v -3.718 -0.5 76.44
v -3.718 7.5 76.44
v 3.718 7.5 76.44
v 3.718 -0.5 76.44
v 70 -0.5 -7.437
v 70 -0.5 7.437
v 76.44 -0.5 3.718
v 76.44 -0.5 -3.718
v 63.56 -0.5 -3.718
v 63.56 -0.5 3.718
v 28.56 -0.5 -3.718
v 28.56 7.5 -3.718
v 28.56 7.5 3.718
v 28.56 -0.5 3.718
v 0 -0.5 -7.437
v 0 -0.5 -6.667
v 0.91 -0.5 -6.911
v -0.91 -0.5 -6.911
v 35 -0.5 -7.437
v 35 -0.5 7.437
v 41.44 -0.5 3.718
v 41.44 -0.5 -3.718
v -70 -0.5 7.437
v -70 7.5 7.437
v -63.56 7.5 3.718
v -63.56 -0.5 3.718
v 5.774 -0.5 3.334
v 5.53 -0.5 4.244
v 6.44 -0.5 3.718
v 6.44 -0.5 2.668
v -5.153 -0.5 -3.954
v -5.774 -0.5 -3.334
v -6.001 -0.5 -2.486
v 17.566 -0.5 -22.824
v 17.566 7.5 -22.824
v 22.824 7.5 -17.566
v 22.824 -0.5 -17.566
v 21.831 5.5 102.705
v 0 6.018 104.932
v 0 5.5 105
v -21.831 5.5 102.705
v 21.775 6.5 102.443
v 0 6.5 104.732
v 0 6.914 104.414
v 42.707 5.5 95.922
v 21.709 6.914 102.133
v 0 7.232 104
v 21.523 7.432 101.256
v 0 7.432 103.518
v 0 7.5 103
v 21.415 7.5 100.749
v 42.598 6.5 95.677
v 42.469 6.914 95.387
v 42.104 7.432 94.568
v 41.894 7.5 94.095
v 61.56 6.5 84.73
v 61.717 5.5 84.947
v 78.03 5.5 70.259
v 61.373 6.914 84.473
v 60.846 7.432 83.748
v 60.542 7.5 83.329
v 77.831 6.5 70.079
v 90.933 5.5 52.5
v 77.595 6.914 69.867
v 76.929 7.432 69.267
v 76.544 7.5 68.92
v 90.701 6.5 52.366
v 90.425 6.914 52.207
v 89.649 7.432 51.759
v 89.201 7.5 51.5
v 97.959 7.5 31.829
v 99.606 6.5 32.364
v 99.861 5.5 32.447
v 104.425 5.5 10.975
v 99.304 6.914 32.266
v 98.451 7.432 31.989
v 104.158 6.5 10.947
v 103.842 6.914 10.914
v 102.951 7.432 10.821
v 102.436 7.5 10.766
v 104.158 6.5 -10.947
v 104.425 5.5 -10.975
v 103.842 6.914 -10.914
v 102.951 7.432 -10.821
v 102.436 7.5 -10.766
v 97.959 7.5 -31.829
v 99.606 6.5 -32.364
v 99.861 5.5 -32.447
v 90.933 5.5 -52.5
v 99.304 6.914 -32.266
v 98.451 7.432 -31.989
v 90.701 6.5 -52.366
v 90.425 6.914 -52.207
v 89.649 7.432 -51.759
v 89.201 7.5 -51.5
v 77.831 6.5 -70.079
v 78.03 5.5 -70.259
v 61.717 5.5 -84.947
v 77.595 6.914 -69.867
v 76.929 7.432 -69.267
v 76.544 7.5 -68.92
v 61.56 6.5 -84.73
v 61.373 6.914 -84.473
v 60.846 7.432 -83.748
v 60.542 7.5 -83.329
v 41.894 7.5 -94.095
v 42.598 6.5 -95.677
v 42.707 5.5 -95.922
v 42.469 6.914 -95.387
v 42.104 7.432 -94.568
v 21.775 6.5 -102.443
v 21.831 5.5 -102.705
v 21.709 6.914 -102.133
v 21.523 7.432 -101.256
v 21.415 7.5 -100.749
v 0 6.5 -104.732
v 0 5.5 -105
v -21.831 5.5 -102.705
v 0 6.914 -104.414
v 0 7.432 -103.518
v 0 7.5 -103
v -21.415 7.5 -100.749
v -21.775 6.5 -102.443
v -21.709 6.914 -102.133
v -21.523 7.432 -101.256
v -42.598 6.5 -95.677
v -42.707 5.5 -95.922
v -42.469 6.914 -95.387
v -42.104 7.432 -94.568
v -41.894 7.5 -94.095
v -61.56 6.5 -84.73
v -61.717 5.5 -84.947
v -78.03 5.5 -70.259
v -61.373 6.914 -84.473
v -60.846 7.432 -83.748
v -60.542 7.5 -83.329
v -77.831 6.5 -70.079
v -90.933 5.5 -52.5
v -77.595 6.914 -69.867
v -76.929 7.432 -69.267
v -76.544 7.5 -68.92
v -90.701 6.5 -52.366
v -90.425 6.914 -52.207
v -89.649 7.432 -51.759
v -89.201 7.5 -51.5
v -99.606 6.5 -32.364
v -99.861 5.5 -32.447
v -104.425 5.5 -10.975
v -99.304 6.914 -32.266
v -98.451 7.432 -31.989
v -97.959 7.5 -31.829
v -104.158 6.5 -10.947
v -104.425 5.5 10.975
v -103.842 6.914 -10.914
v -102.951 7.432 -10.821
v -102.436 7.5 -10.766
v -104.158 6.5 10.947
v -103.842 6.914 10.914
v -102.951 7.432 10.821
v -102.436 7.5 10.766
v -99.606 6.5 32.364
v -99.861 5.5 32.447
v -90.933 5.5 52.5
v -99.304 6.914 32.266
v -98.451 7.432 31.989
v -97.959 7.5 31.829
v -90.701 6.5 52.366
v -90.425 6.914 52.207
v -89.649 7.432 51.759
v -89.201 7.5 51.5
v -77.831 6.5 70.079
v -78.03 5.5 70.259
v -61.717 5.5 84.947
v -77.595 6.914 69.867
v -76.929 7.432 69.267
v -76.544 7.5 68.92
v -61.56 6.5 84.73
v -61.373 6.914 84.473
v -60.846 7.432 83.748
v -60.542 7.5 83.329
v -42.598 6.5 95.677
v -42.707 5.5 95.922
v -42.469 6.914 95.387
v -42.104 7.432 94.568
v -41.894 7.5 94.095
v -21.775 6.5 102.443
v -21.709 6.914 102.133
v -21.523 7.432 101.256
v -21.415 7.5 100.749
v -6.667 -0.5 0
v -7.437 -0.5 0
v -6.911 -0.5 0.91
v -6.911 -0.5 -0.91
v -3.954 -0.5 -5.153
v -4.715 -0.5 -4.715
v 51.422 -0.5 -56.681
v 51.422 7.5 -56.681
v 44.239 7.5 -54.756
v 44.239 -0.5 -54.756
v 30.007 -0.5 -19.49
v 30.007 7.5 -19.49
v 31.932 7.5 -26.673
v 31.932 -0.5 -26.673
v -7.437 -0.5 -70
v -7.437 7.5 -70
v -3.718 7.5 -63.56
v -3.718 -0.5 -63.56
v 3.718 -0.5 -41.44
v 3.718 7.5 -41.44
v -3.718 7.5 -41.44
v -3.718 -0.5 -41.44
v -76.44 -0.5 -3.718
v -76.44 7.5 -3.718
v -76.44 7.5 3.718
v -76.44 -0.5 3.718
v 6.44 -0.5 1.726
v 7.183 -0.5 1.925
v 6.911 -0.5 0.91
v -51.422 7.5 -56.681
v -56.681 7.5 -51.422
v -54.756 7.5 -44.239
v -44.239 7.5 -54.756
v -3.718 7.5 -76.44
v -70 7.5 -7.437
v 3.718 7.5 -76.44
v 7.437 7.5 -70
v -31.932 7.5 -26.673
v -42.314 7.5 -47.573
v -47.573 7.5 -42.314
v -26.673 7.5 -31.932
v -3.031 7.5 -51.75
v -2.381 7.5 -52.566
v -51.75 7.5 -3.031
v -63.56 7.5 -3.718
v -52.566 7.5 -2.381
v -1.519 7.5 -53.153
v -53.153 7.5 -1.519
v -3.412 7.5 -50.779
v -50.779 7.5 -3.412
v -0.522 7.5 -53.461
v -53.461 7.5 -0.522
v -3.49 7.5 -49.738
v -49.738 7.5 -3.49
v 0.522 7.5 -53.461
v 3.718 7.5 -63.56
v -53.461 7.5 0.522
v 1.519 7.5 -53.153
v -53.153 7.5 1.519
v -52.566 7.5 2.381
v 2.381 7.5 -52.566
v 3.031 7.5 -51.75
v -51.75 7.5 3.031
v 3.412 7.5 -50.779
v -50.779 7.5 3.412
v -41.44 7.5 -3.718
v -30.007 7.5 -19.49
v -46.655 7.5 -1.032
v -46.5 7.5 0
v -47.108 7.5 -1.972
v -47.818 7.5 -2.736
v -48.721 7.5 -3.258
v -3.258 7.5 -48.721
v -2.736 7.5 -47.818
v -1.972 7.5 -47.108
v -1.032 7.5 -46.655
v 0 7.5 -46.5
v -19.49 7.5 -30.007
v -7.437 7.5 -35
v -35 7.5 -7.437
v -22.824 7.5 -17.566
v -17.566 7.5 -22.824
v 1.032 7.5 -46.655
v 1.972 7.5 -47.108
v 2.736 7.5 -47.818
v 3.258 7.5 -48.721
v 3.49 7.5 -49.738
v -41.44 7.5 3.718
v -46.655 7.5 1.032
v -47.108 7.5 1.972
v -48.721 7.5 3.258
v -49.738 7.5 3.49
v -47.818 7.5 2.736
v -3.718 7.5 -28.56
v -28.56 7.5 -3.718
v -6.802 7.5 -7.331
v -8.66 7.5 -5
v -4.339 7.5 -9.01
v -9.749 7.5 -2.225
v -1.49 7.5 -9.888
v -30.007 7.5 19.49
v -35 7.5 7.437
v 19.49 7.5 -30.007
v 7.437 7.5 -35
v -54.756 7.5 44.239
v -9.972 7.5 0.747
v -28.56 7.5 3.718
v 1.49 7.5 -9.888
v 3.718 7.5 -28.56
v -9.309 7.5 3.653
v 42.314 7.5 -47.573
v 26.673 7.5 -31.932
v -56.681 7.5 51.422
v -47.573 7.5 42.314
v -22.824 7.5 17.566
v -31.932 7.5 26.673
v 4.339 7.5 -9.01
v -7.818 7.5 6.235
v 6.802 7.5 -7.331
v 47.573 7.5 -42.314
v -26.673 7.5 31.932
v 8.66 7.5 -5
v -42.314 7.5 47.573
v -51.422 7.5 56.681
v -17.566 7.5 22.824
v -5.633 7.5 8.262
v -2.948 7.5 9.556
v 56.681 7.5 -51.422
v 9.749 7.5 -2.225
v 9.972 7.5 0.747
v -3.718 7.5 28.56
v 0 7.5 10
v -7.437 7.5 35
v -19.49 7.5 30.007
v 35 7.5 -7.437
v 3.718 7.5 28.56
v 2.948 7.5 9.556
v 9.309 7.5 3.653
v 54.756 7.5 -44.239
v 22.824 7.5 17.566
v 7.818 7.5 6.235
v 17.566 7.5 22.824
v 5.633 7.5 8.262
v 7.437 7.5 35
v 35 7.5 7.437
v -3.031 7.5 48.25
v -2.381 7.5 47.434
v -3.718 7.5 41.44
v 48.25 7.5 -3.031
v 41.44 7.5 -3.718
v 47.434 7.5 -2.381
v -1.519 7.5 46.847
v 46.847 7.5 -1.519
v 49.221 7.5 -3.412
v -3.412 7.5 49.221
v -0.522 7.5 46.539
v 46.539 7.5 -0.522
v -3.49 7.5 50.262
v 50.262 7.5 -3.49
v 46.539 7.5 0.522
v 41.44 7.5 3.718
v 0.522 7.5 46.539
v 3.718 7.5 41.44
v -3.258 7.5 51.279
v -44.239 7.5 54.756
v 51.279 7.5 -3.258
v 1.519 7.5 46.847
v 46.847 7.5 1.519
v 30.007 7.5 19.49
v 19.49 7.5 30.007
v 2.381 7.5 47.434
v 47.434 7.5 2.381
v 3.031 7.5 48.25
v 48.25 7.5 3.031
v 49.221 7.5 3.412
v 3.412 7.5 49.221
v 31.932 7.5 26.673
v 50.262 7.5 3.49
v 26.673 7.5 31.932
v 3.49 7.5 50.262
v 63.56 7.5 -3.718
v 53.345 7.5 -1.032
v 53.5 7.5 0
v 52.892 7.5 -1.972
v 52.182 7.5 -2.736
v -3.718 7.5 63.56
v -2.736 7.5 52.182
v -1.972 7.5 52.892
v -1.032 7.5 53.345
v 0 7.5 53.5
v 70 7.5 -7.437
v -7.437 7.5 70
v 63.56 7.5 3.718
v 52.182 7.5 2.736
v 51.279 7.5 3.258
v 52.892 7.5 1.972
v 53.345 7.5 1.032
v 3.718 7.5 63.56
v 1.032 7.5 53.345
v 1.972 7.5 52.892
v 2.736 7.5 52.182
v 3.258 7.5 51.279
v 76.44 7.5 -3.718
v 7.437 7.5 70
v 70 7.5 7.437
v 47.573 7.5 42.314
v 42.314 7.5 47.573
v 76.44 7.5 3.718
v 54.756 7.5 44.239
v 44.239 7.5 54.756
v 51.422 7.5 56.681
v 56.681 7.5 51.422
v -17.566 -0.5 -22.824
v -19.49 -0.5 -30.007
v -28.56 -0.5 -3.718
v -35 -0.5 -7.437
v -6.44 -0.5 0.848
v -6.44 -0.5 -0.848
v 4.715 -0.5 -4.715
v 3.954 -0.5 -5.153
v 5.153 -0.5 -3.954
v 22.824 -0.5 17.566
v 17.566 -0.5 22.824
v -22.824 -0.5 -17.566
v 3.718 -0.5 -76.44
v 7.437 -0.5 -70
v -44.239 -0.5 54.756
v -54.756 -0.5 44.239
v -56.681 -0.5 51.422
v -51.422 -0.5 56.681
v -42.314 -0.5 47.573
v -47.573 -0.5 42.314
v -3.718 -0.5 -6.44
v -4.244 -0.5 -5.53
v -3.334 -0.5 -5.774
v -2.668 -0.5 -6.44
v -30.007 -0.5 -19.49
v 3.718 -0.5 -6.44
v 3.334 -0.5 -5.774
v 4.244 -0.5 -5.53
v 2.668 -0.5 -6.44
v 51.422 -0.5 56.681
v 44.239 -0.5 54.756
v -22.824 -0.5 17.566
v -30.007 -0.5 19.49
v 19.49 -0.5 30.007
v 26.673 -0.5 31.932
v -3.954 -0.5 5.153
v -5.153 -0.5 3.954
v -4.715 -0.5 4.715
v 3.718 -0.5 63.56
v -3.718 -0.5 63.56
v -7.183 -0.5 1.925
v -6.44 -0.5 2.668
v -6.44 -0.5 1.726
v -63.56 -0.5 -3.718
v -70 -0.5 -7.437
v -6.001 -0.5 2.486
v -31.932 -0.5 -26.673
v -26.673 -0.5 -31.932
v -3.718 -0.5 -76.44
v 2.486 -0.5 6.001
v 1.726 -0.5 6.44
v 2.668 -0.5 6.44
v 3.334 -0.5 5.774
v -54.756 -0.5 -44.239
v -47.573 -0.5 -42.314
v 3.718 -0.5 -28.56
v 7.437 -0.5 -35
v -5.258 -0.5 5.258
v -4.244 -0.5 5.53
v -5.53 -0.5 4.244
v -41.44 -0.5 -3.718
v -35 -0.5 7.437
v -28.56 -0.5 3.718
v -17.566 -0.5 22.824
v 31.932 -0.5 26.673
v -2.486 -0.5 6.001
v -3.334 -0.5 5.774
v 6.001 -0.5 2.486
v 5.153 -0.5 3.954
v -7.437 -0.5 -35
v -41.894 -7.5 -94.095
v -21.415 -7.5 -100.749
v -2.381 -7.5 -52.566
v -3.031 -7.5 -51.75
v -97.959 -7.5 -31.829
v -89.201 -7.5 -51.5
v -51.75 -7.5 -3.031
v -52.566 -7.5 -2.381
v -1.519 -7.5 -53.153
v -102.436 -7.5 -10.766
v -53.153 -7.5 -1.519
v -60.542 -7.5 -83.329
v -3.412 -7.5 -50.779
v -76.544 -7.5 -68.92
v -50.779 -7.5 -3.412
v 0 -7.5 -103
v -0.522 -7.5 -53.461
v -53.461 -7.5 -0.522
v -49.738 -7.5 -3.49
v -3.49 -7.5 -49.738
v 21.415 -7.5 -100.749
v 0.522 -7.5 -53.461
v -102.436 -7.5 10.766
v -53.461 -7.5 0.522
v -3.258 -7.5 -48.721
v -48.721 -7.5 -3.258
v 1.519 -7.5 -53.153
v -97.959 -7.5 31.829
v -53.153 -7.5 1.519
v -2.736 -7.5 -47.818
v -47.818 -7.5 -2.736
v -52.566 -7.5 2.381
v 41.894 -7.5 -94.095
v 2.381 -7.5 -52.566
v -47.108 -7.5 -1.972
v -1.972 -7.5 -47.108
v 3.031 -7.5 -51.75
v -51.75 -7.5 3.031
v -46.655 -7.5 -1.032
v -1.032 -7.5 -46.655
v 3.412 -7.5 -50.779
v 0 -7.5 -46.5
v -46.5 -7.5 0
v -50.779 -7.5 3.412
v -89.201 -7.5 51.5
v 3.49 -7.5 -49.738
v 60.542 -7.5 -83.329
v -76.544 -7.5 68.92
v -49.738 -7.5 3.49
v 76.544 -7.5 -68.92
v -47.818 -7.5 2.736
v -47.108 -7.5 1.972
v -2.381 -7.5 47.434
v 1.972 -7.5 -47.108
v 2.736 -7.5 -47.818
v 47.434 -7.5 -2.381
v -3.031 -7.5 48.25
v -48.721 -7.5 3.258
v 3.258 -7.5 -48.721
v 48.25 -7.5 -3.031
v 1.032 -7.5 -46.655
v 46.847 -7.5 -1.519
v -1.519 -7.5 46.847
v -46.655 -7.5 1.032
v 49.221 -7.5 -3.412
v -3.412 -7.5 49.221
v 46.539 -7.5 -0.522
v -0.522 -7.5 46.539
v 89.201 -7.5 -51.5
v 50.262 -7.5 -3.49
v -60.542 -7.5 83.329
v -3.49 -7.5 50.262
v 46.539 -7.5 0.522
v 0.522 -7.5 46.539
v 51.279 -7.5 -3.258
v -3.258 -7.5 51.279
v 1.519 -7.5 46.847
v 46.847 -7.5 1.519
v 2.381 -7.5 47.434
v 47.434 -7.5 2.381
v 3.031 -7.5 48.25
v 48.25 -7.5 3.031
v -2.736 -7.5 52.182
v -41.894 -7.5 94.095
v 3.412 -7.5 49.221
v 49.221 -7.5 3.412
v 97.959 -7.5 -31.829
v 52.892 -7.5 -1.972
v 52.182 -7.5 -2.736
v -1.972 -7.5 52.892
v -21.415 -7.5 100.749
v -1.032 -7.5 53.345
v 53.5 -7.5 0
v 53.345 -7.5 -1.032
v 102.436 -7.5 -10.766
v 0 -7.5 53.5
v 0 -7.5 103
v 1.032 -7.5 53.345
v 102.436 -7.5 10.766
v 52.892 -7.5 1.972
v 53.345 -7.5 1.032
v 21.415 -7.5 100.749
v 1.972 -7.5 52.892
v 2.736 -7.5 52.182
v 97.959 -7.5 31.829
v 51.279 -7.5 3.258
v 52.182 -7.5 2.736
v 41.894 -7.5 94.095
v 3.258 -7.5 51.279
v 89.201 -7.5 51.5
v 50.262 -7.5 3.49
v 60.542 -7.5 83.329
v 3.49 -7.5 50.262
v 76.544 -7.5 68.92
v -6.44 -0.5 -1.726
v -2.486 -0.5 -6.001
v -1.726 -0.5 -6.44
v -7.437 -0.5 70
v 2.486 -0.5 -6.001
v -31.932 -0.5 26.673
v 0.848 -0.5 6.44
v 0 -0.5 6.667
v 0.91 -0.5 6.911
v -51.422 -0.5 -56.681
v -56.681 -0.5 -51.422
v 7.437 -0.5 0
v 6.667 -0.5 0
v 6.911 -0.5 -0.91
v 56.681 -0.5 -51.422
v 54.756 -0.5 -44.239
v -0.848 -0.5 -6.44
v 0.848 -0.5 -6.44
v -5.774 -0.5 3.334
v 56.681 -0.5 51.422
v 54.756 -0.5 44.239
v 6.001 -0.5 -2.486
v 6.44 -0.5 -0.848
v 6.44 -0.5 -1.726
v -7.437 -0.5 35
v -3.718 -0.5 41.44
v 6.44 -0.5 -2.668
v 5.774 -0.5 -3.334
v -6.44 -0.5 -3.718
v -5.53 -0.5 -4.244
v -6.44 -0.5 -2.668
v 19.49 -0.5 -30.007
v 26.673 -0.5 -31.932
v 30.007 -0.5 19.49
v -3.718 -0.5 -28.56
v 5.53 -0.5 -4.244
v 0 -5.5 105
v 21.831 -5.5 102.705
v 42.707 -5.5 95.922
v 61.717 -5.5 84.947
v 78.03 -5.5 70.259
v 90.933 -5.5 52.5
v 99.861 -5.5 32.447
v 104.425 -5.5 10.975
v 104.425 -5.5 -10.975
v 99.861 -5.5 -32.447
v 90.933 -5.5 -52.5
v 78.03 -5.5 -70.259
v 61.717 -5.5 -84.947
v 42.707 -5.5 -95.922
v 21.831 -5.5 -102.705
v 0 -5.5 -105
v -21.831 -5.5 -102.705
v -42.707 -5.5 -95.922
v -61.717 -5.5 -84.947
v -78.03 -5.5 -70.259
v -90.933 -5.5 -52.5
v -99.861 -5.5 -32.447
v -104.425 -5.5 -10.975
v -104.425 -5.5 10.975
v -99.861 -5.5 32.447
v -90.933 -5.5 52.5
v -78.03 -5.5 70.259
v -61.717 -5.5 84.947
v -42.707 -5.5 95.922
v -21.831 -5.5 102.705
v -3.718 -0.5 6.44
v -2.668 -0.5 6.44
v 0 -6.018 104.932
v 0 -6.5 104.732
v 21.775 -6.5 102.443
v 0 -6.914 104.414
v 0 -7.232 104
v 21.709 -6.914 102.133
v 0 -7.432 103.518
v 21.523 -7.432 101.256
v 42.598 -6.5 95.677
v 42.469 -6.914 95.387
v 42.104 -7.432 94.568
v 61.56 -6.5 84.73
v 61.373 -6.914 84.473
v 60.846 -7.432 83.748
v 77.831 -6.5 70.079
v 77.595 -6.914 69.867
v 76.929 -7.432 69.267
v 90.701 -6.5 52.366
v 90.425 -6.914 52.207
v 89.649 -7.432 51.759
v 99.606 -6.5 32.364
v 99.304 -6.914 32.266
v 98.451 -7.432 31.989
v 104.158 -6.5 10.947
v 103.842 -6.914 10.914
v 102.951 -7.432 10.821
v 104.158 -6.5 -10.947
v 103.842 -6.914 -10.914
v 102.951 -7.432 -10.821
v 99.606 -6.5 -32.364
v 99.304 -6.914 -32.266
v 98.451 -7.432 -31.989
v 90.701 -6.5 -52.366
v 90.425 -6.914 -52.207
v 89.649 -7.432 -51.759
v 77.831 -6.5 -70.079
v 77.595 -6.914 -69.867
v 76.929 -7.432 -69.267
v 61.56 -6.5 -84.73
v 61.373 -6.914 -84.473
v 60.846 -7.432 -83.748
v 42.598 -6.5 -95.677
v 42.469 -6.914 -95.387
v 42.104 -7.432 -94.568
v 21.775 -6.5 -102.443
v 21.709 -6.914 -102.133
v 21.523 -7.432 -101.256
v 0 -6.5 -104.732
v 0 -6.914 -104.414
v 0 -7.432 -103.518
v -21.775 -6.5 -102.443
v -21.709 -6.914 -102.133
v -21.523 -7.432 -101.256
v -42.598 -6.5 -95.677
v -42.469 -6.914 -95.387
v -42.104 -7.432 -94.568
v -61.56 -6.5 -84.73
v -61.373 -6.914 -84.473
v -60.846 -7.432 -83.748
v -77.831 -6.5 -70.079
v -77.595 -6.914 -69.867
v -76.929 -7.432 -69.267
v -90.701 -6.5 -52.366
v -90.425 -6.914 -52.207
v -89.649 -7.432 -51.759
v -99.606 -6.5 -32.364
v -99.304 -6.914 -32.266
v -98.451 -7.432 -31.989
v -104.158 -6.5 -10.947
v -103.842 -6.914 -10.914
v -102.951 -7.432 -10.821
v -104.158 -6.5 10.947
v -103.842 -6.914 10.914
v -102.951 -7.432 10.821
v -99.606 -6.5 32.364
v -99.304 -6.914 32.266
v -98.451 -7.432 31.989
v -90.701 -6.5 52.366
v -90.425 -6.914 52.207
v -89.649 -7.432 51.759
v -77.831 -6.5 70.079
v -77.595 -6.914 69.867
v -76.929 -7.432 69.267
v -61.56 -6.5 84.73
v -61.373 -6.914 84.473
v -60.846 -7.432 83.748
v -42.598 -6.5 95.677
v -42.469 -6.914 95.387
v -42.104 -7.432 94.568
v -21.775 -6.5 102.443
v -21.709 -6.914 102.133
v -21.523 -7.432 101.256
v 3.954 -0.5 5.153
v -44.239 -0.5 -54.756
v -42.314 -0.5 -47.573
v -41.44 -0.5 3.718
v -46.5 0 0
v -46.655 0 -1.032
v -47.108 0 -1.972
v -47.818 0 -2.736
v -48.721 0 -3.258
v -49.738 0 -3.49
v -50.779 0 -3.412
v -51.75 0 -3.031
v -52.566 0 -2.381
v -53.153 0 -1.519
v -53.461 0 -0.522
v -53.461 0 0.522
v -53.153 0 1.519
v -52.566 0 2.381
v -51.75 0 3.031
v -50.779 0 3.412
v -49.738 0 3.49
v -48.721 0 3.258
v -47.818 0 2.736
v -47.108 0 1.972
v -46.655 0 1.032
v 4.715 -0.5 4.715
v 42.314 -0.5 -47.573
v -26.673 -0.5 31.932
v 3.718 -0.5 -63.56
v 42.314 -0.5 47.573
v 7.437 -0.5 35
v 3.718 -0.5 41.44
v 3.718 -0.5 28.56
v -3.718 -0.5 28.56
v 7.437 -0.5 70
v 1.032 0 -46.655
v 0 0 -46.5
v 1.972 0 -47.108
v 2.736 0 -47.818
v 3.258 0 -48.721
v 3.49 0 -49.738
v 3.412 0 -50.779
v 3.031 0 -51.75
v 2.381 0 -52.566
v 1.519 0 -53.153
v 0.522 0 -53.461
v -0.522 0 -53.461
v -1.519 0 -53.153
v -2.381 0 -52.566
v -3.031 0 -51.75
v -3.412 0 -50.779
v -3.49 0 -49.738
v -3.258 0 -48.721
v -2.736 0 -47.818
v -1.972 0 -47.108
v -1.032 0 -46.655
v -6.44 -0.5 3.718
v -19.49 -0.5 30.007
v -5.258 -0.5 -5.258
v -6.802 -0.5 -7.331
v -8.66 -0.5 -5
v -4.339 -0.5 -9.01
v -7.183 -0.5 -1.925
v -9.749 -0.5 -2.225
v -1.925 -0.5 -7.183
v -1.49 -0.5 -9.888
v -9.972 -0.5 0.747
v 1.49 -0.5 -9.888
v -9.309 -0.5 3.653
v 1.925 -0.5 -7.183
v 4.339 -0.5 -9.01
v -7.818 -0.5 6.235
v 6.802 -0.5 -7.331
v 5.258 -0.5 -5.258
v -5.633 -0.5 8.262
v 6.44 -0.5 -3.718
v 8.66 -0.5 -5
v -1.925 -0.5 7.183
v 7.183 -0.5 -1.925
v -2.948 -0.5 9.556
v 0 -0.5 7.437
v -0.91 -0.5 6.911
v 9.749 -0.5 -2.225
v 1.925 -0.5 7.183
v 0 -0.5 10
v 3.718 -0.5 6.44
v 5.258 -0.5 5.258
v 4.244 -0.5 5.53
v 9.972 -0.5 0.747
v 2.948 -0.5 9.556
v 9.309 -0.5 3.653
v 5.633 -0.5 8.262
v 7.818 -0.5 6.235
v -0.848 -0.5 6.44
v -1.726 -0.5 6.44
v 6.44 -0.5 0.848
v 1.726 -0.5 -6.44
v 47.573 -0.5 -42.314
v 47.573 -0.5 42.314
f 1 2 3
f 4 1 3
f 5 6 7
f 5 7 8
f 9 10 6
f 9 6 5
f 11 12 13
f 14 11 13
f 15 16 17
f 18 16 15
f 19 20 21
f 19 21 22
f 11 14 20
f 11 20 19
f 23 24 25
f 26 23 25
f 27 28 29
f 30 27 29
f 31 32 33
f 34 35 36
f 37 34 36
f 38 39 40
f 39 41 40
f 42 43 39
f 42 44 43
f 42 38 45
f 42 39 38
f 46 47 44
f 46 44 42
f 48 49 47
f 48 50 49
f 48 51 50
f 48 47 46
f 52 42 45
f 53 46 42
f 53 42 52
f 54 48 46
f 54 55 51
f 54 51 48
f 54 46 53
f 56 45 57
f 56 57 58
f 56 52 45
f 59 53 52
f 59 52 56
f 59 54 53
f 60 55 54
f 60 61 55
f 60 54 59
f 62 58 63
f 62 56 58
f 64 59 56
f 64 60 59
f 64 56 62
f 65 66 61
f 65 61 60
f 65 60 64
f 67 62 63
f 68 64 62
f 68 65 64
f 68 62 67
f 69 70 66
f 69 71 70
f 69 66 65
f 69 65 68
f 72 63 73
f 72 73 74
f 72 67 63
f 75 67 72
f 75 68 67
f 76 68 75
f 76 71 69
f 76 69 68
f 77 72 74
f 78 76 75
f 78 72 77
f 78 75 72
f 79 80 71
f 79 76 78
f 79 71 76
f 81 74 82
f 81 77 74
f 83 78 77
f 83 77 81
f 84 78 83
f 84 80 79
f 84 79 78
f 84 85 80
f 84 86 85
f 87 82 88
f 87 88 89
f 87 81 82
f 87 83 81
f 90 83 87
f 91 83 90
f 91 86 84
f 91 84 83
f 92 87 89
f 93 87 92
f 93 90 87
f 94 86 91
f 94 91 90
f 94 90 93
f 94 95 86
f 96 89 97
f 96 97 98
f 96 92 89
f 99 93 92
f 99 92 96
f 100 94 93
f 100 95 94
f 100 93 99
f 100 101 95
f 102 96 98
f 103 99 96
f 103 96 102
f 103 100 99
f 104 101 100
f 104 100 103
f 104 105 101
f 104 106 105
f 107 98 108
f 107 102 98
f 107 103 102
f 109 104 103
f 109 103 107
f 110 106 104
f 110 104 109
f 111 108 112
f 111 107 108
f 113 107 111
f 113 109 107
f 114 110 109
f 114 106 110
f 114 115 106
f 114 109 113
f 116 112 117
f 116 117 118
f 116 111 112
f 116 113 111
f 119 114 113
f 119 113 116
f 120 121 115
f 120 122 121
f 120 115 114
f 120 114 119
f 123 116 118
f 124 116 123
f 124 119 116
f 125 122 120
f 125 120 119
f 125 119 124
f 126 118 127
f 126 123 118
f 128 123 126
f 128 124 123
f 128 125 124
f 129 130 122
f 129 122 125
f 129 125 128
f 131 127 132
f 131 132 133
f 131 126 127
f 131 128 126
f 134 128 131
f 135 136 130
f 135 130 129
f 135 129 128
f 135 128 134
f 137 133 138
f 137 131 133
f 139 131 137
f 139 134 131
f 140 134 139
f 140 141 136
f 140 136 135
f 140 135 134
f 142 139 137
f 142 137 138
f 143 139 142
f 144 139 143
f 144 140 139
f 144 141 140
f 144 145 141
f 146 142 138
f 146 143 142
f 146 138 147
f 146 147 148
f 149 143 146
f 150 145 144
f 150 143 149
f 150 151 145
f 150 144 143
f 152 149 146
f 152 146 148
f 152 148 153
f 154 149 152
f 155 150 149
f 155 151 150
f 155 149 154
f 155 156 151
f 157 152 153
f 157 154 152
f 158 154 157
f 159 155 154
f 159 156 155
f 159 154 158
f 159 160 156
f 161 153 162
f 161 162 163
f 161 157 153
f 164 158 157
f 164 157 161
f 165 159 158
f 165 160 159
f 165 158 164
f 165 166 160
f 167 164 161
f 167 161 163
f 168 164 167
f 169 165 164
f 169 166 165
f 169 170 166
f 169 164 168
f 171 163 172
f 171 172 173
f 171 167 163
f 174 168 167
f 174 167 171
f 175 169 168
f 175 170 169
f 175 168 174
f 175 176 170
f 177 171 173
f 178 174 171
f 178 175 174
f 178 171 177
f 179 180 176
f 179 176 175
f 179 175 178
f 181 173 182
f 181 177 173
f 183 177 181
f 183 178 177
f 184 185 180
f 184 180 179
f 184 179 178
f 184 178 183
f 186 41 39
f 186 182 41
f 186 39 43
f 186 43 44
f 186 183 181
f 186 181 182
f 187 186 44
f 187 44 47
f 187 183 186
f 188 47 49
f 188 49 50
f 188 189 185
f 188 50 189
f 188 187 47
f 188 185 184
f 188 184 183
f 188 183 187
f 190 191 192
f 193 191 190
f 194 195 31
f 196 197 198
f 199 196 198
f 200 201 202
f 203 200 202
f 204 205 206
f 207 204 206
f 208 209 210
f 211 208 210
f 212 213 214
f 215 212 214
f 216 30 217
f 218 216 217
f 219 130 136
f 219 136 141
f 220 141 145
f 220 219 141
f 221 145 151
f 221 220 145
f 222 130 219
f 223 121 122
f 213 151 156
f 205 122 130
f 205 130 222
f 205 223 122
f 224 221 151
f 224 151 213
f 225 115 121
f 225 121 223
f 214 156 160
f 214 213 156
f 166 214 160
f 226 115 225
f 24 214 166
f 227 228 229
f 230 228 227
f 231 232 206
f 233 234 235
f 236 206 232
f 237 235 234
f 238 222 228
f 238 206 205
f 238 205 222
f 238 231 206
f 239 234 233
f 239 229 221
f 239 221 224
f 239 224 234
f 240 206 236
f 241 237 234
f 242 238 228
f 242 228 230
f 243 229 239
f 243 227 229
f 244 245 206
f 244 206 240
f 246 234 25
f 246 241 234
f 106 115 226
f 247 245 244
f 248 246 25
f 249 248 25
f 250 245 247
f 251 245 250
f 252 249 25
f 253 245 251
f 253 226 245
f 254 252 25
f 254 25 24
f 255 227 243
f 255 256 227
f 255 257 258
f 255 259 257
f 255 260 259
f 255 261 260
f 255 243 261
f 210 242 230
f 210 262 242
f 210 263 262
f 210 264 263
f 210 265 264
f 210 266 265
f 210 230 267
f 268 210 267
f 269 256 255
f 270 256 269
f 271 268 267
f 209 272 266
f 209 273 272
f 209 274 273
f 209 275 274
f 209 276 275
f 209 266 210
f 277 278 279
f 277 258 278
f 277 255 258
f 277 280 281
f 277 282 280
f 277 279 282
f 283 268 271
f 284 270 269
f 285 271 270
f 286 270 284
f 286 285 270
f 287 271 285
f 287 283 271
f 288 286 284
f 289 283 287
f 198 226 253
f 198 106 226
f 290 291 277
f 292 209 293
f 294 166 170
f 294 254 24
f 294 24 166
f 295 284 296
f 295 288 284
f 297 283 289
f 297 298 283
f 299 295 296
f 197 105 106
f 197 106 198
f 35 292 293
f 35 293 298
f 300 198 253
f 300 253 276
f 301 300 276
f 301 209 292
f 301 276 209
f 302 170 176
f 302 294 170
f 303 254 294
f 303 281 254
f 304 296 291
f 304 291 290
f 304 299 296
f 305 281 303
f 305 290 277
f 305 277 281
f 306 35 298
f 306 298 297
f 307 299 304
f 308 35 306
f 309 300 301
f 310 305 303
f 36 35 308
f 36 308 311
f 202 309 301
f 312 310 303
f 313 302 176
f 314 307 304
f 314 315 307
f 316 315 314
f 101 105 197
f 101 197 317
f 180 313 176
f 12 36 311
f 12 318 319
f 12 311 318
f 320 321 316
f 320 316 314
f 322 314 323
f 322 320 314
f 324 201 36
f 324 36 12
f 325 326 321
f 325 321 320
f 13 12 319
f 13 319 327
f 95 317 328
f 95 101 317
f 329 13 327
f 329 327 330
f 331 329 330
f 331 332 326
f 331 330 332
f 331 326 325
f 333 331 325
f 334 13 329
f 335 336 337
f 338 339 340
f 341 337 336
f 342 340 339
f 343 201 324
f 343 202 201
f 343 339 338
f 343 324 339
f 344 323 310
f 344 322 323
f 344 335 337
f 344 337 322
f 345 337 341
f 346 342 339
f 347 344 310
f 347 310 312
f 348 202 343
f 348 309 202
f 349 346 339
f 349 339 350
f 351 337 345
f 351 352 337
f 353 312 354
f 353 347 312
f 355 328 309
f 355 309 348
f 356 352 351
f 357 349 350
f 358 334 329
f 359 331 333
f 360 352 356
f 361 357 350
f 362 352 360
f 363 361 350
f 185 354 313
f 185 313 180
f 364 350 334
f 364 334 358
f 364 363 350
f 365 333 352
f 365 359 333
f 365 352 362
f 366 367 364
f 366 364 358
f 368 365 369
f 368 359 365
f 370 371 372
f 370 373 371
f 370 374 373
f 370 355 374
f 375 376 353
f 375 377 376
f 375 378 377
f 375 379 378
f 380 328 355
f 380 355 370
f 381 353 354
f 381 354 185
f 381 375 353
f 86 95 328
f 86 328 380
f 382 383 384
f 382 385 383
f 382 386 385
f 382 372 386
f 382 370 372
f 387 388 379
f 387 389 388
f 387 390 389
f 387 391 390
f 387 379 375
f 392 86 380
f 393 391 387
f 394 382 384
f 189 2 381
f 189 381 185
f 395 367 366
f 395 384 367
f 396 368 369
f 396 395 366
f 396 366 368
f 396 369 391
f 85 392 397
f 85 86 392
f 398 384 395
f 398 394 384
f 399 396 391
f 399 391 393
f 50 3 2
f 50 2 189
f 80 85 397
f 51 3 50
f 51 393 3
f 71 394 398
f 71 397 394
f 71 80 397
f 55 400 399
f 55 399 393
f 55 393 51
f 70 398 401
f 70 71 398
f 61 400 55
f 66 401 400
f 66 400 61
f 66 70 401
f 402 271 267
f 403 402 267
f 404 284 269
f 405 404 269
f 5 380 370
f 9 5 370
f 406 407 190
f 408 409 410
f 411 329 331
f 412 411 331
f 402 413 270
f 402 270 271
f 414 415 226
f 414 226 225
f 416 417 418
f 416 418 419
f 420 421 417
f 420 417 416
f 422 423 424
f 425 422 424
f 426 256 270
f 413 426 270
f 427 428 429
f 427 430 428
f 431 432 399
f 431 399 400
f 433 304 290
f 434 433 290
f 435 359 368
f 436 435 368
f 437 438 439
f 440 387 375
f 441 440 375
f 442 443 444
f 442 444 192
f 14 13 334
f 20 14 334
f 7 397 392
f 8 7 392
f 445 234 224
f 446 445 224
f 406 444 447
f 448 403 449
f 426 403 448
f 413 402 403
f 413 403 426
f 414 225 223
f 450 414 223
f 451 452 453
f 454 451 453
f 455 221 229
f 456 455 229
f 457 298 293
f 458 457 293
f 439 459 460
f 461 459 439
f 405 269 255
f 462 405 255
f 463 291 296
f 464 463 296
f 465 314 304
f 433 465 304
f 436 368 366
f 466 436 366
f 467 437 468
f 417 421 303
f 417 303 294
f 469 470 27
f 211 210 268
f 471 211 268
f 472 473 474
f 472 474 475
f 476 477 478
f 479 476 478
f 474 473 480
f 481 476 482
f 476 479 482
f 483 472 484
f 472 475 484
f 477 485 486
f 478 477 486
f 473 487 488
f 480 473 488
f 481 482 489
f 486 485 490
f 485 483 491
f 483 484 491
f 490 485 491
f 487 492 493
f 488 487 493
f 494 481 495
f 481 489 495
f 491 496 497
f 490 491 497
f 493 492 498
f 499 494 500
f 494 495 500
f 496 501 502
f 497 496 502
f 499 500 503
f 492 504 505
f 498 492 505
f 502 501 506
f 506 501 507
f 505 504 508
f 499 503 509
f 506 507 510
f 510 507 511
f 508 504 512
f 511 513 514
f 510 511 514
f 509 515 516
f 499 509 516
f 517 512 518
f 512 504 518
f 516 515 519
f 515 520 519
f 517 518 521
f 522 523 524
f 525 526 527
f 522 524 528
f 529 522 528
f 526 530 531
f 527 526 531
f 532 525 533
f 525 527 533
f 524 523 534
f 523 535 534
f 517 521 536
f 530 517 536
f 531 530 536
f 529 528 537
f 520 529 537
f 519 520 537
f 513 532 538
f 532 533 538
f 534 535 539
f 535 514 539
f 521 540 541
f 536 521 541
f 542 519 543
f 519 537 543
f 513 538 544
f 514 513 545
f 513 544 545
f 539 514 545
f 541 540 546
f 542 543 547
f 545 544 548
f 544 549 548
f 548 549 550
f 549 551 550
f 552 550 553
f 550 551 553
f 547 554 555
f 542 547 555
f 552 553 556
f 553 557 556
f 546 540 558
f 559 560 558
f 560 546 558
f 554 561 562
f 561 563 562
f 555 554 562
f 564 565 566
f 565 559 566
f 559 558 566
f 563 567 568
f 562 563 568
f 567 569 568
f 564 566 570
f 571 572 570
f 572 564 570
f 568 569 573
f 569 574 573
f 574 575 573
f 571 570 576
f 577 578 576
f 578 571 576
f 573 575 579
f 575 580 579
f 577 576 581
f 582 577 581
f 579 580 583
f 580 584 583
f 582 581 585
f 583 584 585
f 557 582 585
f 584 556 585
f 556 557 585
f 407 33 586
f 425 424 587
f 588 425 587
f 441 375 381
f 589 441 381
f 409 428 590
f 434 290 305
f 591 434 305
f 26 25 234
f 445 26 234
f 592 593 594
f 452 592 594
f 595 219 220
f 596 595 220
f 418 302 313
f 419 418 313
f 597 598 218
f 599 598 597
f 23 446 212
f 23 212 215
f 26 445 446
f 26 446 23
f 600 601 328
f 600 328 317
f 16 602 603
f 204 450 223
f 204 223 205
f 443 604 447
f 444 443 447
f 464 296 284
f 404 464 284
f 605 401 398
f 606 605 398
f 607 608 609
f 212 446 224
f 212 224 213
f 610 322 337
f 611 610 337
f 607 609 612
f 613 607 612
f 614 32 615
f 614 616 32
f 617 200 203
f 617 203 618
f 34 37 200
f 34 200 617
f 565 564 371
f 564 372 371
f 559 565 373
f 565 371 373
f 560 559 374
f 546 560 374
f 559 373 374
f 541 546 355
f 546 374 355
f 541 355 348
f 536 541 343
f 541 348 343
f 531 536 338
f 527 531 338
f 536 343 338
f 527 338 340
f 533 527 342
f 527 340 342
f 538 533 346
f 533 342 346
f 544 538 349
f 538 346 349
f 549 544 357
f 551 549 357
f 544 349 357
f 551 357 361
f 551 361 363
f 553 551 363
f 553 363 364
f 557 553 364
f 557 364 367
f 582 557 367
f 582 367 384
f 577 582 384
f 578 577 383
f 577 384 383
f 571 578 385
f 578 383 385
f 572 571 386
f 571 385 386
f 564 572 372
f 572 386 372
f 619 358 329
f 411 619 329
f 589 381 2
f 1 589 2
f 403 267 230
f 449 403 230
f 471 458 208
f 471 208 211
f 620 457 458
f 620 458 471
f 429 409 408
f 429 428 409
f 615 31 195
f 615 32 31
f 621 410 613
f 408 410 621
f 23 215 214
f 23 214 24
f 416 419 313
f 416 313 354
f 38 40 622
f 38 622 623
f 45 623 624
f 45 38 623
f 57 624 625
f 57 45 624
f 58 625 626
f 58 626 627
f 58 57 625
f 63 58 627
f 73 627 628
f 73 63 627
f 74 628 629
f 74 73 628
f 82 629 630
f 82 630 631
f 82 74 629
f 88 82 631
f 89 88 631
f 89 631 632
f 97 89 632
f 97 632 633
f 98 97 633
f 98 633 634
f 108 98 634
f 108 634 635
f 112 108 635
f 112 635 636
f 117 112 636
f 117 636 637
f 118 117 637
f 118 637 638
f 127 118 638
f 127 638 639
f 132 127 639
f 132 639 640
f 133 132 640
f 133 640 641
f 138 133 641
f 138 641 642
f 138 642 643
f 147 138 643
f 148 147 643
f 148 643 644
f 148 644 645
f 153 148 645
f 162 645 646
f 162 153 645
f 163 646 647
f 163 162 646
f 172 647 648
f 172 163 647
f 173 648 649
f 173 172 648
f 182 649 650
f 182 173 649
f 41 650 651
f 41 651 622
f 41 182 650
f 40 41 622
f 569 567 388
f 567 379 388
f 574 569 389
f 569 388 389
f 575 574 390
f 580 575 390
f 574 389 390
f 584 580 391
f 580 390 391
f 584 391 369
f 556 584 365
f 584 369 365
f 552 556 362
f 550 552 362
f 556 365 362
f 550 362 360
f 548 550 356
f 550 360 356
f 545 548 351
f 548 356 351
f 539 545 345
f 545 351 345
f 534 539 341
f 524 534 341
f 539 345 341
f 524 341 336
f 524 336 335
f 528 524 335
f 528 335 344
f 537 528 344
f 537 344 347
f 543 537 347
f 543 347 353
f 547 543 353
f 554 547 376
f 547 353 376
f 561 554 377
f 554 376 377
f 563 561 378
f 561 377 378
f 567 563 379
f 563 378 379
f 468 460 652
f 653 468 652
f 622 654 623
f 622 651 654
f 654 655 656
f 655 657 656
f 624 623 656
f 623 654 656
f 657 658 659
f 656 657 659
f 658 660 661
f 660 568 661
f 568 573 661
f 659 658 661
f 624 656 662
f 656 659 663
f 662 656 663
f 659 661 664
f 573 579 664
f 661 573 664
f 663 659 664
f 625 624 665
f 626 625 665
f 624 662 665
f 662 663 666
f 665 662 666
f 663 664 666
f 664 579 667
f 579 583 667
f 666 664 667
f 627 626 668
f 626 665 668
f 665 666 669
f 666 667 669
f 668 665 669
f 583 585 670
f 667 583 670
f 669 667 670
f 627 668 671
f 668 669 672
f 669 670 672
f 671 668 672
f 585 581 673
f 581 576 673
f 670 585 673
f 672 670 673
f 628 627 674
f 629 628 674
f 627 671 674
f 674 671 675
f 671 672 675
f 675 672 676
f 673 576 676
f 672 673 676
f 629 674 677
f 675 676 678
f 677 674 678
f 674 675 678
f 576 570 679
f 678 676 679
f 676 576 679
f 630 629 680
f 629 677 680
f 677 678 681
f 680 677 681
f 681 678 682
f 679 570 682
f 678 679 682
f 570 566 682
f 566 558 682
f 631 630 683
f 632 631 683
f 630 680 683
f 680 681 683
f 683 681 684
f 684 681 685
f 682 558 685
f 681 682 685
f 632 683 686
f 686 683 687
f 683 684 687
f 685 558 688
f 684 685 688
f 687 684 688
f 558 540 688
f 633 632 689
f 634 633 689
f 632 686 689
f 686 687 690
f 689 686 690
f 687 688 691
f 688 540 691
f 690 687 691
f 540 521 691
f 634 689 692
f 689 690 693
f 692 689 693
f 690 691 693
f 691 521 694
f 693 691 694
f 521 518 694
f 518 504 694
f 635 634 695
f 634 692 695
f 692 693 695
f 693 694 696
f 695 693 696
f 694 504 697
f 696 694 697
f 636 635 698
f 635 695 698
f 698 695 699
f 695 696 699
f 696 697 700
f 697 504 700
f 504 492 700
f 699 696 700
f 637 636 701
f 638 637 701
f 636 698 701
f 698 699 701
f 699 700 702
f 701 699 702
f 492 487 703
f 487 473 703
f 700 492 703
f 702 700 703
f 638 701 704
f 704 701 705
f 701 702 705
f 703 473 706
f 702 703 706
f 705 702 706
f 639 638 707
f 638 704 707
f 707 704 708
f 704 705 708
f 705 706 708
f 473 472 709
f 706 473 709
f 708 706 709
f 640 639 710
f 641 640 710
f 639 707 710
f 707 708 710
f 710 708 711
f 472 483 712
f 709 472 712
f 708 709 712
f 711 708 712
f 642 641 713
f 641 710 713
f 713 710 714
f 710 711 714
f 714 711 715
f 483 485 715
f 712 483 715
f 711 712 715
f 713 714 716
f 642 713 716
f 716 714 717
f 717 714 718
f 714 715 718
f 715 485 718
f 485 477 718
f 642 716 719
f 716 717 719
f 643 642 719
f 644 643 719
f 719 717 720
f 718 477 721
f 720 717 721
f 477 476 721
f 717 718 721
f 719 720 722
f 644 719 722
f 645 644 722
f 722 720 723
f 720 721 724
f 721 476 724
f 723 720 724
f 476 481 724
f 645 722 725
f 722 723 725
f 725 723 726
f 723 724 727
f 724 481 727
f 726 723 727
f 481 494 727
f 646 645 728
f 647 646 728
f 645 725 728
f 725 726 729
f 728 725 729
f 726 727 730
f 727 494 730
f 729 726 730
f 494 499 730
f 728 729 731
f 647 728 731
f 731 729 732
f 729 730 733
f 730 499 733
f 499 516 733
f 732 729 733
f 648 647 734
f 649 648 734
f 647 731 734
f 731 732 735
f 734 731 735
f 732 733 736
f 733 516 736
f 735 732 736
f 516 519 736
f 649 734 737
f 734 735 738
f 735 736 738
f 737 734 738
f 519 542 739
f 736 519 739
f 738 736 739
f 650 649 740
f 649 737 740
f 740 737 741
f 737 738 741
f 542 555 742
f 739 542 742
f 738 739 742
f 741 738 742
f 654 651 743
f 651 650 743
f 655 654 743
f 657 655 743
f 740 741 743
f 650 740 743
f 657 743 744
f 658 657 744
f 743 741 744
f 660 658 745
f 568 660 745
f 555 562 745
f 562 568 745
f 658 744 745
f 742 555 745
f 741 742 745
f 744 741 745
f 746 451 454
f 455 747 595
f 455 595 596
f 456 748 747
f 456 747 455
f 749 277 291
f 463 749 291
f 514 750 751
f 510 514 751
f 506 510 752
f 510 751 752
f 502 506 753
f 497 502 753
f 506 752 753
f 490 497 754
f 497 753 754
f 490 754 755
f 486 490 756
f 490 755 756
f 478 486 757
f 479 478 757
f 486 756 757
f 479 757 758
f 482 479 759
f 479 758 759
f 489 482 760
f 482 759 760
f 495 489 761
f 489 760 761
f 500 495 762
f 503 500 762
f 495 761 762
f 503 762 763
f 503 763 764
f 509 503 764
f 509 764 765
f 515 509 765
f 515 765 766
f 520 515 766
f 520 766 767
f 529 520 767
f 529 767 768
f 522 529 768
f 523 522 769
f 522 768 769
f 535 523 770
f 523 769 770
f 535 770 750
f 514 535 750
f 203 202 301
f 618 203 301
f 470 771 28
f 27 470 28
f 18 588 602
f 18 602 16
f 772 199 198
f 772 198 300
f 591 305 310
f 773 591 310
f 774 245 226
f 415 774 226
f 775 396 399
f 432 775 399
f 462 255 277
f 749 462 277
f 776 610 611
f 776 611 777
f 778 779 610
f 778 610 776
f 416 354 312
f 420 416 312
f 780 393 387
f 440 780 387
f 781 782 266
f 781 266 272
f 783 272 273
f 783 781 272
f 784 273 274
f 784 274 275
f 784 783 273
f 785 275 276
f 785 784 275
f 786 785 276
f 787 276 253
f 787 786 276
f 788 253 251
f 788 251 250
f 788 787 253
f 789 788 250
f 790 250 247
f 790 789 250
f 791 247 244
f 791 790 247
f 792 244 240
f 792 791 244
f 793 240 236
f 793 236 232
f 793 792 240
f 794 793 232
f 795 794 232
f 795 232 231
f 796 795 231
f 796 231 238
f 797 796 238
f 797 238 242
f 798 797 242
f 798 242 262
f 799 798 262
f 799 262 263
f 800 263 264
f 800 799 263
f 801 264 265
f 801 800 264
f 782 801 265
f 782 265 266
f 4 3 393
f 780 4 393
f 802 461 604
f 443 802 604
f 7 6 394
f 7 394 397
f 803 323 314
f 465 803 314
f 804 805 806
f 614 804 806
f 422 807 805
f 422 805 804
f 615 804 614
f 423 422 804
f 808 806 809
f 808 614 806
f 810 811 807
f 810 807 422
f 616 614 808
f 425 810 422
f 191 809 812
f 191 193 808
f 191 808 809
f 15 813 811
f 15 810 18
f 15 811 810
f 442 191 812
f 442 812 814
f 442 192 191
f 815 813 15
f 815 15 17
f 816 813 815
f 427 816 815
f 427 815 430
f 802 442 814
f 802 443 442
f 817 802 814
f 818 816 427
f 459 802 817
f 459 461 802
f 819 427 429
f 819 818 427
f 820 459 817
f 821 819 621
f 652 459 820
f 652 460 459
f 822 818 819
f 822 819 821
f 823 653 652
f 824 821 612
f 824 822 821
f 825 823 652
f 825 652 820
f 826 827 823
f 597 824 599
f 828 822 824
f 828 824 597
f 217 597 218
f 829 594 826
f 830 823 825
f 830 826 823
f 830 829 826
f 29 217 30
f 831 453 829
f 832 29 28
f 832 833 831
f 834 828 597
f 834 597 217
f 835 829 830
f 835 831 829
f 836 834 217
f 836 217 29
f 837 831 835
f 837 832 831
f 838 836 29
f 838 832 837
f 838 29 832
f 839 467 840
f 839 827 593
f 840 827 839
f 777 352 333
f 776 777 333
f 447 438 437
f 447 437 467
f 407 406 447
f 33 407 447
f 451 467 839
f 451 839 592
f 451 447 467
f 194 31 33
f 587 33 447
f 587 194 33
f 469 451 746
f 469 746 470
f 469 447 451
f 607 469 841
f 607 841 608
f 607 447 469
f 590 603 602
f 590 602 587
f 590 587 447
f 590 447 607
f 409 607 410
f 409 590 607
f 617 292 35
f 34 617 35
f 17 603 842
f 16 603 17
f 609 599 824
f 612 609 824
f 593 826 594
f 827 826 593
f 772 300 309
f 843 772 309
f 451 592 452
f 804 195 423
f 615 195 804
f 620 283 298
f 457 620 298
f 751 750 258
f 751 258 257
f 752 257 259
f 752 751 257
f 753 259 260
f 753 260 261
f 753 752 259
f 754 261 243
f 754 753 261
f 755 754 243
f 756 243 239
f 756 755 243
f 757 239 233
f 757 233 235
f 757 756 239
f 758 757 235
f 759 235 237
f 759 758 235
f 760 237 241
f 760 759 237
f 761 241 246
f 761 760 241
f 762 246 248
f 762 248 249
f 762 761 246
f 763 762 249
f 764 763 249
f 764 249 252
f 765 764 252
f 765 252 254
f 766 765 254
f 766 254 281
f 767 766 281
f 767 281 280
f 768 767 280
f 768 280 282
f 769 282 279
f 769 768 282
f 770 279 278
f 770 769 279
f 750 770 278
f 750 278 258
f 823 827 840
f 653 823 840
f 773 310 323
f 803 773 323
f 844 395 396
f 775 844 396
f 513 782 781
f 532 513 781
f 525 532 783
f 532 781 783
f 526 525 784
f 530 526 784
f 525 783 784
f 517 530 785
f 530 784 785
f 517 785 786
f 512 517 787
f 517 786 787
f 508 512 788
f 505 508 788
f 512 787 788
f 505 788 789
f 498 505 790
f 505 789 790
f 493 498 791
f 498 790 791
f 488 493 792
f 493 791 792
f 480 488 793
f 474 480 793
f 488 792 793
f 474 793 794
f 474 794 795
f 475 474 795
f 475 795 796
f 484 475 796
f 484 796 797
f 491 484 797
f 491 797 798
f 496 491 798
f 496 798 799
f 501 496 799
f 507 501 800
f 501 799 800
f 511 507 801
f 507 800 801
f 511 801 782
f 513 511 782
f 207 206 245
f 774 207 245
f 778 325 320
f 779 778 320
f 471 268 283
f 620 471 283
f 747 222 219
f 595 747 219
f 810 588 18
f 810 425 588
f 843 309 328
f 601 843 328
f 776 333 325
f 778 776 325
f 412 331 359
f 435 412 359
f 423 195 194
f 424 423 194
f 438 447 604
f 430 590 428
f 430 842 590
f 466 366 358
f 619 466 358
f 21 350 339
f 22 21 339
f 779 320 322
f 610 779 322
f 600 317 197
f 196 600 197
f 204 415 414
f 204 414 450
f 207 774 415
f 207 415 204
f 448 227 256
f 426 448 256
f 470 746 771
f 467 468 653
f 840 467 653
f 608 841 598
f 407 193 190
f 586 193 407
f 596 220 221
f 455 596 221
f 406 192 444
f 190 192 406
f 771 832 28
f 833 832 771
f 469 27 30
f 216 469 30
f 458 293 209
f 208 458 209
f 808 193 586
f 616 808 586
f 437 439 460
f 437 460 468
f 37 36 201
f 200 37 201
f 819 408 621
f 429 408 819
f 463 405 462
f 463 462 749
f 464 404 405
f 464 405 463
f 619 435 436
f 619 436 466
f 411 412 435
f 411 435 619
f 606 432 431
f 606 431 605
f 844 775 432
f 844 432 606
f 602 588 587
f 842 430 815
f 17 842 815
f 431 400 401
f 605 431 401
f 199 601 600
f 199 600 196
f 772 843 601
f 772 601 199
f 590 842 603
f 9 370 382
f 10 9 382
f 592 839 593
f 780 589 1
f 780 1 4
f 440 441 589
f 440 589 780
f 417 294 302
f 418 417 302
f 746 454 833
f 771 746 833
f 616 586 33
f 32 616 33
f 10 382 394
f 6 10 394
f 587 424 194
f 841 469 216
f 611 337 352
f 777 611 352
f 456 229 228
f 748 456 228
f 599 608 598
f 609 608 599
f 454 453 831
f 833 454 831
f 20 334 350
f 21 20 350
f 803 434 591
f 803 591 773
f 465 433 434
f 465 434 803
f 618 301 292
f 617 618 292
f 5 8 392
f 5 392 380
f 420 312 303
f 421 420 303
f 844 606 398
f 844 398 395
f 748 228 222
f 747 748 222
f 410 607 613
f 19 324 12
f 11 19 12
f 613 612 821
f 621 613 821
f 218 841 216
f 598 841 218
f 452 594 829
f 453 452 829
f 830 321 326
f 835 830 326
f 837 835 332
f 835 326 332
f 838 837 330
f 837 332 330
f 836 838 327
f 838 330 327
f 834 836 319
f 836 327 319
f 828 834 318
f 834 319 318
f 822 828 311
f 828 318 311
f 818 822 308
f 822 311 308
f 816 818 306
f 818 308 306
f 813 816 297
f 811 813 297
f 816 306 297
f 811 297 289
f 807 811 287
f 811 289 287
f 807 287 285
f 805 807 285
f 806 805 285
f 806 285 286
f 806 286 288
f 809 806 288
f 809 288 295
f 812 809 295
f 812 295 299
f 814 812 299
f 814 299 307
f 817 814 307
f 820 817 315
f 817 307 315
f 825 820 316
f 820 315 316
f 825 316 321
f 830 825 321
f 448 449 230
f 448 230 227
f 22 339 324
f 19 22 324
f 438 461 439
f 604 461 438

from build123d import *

# Parameters (mm, degrees)
SKETCH1_R                 = 105
BOSS_EXTRUDE1_DEPTH       = 7.5
SKETCH2_R                 = 3.5
CUT_EXTRUDE2_DEPTH        = 7.5
CIRPATTERN1_COUNT         = 2
CIRPATTERN1_ANGLE         = 90
FILLET2_R                 = 2
CUT_EXTRUDE3_DEPTH        = 8
LPATTERN1_COUNT           = 3
LPATTERN1_PITCH           = 35
CIRPATTERN2_COUNT         = 8
CIRPATTERN2_COPY_1_DEPTH  = 8
CIRPATTERN2_COPY_2_DEPTH  = 8
CIRPATTERN2_COPY_3_DEPTH  = 8
CIRPATTERN2_COPY_4_DEPTH  = 8
CIRPATTERN2_COPY_5_DEPTH  = 8
CIRPATTERN2_COPY_6_DEPTH  = 8
CIRPATTERN2_COPY_7_DEPTH  = 8
CIRPATTERN2_COPY_8_DEPTH  = 8
CIRPATTERN2_COPY_9_DEPTH  = 8
CIRPATTERN2_COPY_10_DEPTH = 8
CIRPATTERN2_COPY_11_DEPTH = 8
CIRPATTERN2_COPY_12_DEPTH = 8
CIRPATTERN2_COPY_13_DEPTH = 8
CIRPATTERN2_COPY_14_DEPTH = 8
SKETCH4_R                 = 10
CUT_EXTRUDE4_DEPTH        = 8


with BuildPart() as part:
    # Sketch1 → Boss-Extrude1 (new, symmetric)
    with BuildSketch(Plane(origin=(0, 0, 0), x_dir=(1, 0, 0), z_dir=(0, 1, 0))):
        with Locations(Location((0, 0, 0), (0, 0, 270))):
            Circle(SKETCH1_R)
    extrude(amount=BOSS_EXTRUDE1_DEPTH, both=True)

    # Sketch2 → Cut-Extrude2 (cut, symmetric)
    with BuildSketch(Plane(origin=(0, 0, 0), x_dir=(1, 0, 0), z_dir=(0, 1, 0))):
        with Locations(Location((0, 50, 0), (0, 0, 270))):
            Circle(SKETCH2_R)
        with Locations(Location((0, -50, 0), (0, 0, 270))):
            Circle(SKETCH2_R)
    cut_extrude2 = extrude(amount=CUT_EXTRUDE2_DEPTH, both=True, mode=Mode.SUBTRACT)

    # CirPattern1: Cut-Extrude2 ×2 about axis
    cirpattern1_axis = Axis((0, 0, 0), (0, 1, 0))
    for i in range(1, CIRPATTERN1_COUNT):
        add(cut_extrude2.rotate(cirpattern1_axis, i * CIRPATTERN1_ANGLE / (CIRPATTERN1_COUNT - 1)), mode=Mode.SUBTRACT)

    # Fillet2
    fillet2_edges = [part.edges().sort_by_distance(p)[0] for p in [
        (0, -7.5, -105),
        (0, 7.5, -105),
    ]]
    fillet(fillet2_edges, radius=FILLET2_R)

    # Sketch3 → Cut-Extrude3 (cut)
    with BuildSketch(Plane(origin=(0, 7.5, 0), x_dir=(1, 0, 0), z_dir=(0, 1, 0))):
        Polygon((3.718255526, 6.440207487), (-3.718255526, 6.440207487), (-7.436511052, 0), (-3.718255526, -6.440207487), (3.718255526, -6.440207487), (7.436511052, 0), align=None)
    cut_extrude3 = extrude(amount=-CUT_EXTRUDE3_DEPTH, mode=Mode.SUBTRACT)

    # LPattern1: Cut-Extrude3 ×3
    with Locations(*[(0, 0, i * LPATTERN1_PITCH) for i in range(1, LPATTERN1_COUNT)]):
        add(cut_extrude3, mode=Mode.SUBTRACT)

    # CirPattern2: Cut-Extrude3 ×8 about axis
    cirpattern2_axis = Axis((0, 0, 0), (0, 1, 0))
    for i in range(1, CIRPATTERN2_COUNT):
        add(cut_extrude3.rotate(cirpattern2_axis, i * 360 / CIRPATTERN2_COUNT), mode=Mode.SUBTRACT)

    # CirPattern2 copy 1 sketch → CirPattern2 copy 1 (cut)
    with BuildSketch(Plane(origin=(24.748737342, 7.5, 24.748737342), x_dir=(0.7071067811865476, 0, -0.7071067811865475), z_dir=(0, 1, 0))):
        Polygon((3.718255526, 6.440207487), (-3.718255526, 6.440207487), (-7.436511052, 0), (-3.718255526, -6.440207487), (3.718255526, -6.440207487), (7.436511052, 0), align=None)
    extrude(amount=-CIRPATTERN2_COPY_1_DEPTH, mode=Mode.SUBTRACT)

    # CirPattern2 copy 2 sketch → CirPattern2 copy 2 (cut)
    with BuildSketch(Plane(origin=(35, 7.5, 0), x_dir=(0, 0, -1), z_dir=(0, 1, 0))):
        Polygon((3.718255526, 6.440207487), (-3.718255526, 6.440207487), (-7.436511052, 0), (-3.718255526, -6.440207487), (3.718255526, -6.440207487), (7.436511052, 0), align=None)
    extrude(amount=-CIRPATTERN2_COPY_2_DEPTH, mode=Mode.SUBTRACT)

    # CirPattern2 copy 3 sketch → CirPattern2 copy 3 (cut)
    with BuildSketch(Plane(origin=(24.748737342, 7.5, -24.748737342), x_dir=(-0.7071067811865475, 0, -0.7071067811865476), z_dir=(0, 1, 0))):
        Polygon((3.718255526, 6.440207487), (-3.718255526, 6.440207487), (-7.436511052, 0), (-3.718255526, -6.440207487), (3.718255526, -6.440207487), (7.436511052, 0), align=None)
    extrude(amount=-CIRPATTERN2_COPY_3_DEPTH, mode=Mode.SUBTRACT)

    # CirPattern2 copy 4 sketch → CirPattern2 copy 4 (cut)
    with BuildSketch(Plane(origin=(0, 7.5, -35), x_dir=(-1, 0, 0), z_dir=(0, 1, 0))):
        Polygon((3.718255526, 6.440207487), (-3.718255526, 6.440207487), (-7.436511052, 0), (-3.718255526, -6.440207487), (3.718255526, -6.440207487), (7.436511052, 0), align=None)
    extrude(amount=-CIRPATTERN2_COPY_4_DEPTH, mode=Mode.SUBTRACT)

    # CirPattern2 copy 5 sketch → CirPattern2 copy 5 (cut)
    with BuildSketch(Plane(origin=(-24.748737342, 7.5, -24.748737342), x_dir=(-0.7071067811865477, 0, 0.7071067811865475), z_dir=(0, 1, 0))):
        Polygon((3.718255526, 6.440207487), (-3.718255526, 6.440207487), (-7.436511052, 0), (-3.718255526, -6.440207487), (3.718255526, -6.440207487), (7.436511052, 0), align=None)
    extrude(amount=-CIRPATTERN2_COPY_5_DEPTH, mode=Mode.SUBTRACT)

    # CirPattern2 copy 6 sketch → CirPattern2 copy 6 (cut)
    with BuildSketch(Plane(origin=(-35, 7.5, 0), x_dir=(0, 0, 1), z_dir=(0, 1, 0))):
        Polygon((3.718255526, 6.440207487), (-3.718255526, 6.440207487), (-7.436511052, 0), (-3.718255526, -6.440207487), (3.718255526, -6.440207487), (7.436511052, 0), align=None)
    extrude(amount=-CIRPATTERN2_COPY_6_DEPTH, mode=Mode.SUBTRACT)

    # CirPattern2 copy 7 sketch → CirPattern2 copy 7 (cut)
    with BuildSketch(Plane(origin=(-24.748737342, 7.5, 24.748737342), x_dir=(0.7071067811865474, 0, 0.7071067811865477), z_dir=(0, 1, 0))):
        Polygon((3.718255526, 6.440207487), (-3.718255526, 6.440207487), (-7.436511052, 0), (-3.718255526, -6.440207487), (3.718255526, -6.440207487), (7.436511052, 0), align=None)
    extrude(amount=-CIRPATTERN2_COPY_7_DEPTH, mode=Mode.SUBTRACT)

    # CirPattern2 copy 8 sketch → CirPattern2 copy 8 (cut)
    with BuildSketch(Plane(origin=(49.497474683, 7.5, 49.497474683), x_dir=(0.7071067811865476, 0, -0.7071067811865475), z_dir=(0, 1, 0))):
        Polygon((3.718255526, 6.440207487), (-3.718255526, 6.440207487), (-7.436511052, 0), (-3.718255526, -6.440207487), (3.718255526, -6.440207487), (7.436511052, 0), align=None)
    extrude(amount=-CIRPATTERN2_COPY_8_DEPTH, mode=Mode.SUBTRACT)

    # CirPattern2 copy 9 sketch → CirPattern2 copy 9 (cut)
    with BuildSketch(Plane(origin=(70, 7.5, 0), x_dir=(0, 0, -1), z_dir=(0, 1, 0))):
        Polygon((3.718255526, 6.440207487), (-3.718255526, 6.440207487), (-7.436511052, 0), (-3.718255526, -6.440207487), (3.718255526, -6.440207487), (7.436511052, 0), align=None)
    extrude(amount=-CIRPATTERN2_COPY_9_DEPTH, mode=Mode.SUBTRACT)

    # CirPattern2 copy 10 sketch → CirPattern2 copy 10 (cut)
    with BuildSketch(Plane(origin=(49.497474683, 7.5, -49.497474683), x_dir=(-0.7071067811865475, 0, -0.7071067811865476), z_dir=(0, 1, 0))):
        Polygon((3.718255526, 6.440207487), (-3.718255526, 6.440207487), (-7.436511052, 0), (-3.718255526, -6.440207487), (3.718255526, -6.440207487), (7.436511052, 0), align=None)
    extrude(amount=-CIRPATTERN2_COPY_10_DEPTH, mode=Mode.SUBTRACT)

    # CirPattern2 copy 11 sketch → CirPattern2 copy 11 (cut)
    with BuildSketch(Plane(origin=(0, 7.5, -70), x_dir=(-1, 0, 0), z_dir=(0, 1, 0))):
        Polygon((3.718255526, 6.440207487), (-3.718255526, 6.440207487), (-7.436511052, 0), (-3.718255526, -6.440207487), (3.718255526, -6.440207487), (7.436511052, 0), align=None)
    extrude(amount=-CIRPATTERN2_COPY_11_DEPTH, mode=Mode.SUBTRACT)

    # CirPattern2 copy 12 sketch → CirPattern2 copy 12 (cut)
    with BuildSketch(Plane(origin=(-49.497474683, 7.5, -49.497474683), x_dir=(-0.7071067811865477, 0, 0.7071067811865475), z_dir=(0, 1, 0))):
        Polygon((3.718255526, 6.440207487), (-3.718255526, 6.440207487), (-7.436511052, 0), (-3.718255526, -6.440207487), (3.718255526, -6.440207487), (7.436511052, 0), align=None)
    extrude(amount=-CIRPATTERN2_COPY_12_DEPTH, mode=Mode.SUBTRACT)

    # CirPattern2 copy 13 sketch → CirPattern2 copy 13 (cut)
    with BuildSketch(Plane(origin=(-70, 7.5, 0), x_dir=(0, 0, 1), z_dir=(0, 1, 0))):
        Polygon((3.718255526, 6.440207487), (-3.718255526, 6.440207487), (-7.436511052, 0), (-3.718255526, -6.440207487), (3.718255526, -6.440207487), (7.436511052, 0), align=None)
    extrude(amount=-CIRPATTERN2_COPY_13_DEPTH, mode=Mode.SUBTRACT)

    # CirPattern2 copy 14 sketch → CirPattern2 copy 14 (cut)
    with BuildSketch(Plane(origin=(-49.497474683, 7.5, 49.497474683), x_dir=(0.7071067811865474, 0, 0.7071067811865477), z_dir=(0, 1, 0))):
        Polygon((3.718255526, 6.440207487), (-3.718255526, 6.440207487), (-7.436511052, 0), (-3.718255526, -6.440207487), (3.718255526, -6.440207487), (7.436511052, 0), align=None)
    extrude(amount=-CIRPATTERN2_COPY_14_DEPTH, mode=Mode.SUBTRACT)

    # Sketch4 → Cut-Extrude4 (cut)
    with BuildSketch(Plane(origin=(0, 7.5, 0), x_dir=(1, 0, 0), z_dir=(0, 1, 0))):
        with Locations(Location((0, 0, 0), (0, 0, 270))):
            Circle(SKETCH4_R)
    extrude(amount=-CUT_EXTRUDE4_DEPTH, mode=Mode.SUBTRACT)


solid = part.part
